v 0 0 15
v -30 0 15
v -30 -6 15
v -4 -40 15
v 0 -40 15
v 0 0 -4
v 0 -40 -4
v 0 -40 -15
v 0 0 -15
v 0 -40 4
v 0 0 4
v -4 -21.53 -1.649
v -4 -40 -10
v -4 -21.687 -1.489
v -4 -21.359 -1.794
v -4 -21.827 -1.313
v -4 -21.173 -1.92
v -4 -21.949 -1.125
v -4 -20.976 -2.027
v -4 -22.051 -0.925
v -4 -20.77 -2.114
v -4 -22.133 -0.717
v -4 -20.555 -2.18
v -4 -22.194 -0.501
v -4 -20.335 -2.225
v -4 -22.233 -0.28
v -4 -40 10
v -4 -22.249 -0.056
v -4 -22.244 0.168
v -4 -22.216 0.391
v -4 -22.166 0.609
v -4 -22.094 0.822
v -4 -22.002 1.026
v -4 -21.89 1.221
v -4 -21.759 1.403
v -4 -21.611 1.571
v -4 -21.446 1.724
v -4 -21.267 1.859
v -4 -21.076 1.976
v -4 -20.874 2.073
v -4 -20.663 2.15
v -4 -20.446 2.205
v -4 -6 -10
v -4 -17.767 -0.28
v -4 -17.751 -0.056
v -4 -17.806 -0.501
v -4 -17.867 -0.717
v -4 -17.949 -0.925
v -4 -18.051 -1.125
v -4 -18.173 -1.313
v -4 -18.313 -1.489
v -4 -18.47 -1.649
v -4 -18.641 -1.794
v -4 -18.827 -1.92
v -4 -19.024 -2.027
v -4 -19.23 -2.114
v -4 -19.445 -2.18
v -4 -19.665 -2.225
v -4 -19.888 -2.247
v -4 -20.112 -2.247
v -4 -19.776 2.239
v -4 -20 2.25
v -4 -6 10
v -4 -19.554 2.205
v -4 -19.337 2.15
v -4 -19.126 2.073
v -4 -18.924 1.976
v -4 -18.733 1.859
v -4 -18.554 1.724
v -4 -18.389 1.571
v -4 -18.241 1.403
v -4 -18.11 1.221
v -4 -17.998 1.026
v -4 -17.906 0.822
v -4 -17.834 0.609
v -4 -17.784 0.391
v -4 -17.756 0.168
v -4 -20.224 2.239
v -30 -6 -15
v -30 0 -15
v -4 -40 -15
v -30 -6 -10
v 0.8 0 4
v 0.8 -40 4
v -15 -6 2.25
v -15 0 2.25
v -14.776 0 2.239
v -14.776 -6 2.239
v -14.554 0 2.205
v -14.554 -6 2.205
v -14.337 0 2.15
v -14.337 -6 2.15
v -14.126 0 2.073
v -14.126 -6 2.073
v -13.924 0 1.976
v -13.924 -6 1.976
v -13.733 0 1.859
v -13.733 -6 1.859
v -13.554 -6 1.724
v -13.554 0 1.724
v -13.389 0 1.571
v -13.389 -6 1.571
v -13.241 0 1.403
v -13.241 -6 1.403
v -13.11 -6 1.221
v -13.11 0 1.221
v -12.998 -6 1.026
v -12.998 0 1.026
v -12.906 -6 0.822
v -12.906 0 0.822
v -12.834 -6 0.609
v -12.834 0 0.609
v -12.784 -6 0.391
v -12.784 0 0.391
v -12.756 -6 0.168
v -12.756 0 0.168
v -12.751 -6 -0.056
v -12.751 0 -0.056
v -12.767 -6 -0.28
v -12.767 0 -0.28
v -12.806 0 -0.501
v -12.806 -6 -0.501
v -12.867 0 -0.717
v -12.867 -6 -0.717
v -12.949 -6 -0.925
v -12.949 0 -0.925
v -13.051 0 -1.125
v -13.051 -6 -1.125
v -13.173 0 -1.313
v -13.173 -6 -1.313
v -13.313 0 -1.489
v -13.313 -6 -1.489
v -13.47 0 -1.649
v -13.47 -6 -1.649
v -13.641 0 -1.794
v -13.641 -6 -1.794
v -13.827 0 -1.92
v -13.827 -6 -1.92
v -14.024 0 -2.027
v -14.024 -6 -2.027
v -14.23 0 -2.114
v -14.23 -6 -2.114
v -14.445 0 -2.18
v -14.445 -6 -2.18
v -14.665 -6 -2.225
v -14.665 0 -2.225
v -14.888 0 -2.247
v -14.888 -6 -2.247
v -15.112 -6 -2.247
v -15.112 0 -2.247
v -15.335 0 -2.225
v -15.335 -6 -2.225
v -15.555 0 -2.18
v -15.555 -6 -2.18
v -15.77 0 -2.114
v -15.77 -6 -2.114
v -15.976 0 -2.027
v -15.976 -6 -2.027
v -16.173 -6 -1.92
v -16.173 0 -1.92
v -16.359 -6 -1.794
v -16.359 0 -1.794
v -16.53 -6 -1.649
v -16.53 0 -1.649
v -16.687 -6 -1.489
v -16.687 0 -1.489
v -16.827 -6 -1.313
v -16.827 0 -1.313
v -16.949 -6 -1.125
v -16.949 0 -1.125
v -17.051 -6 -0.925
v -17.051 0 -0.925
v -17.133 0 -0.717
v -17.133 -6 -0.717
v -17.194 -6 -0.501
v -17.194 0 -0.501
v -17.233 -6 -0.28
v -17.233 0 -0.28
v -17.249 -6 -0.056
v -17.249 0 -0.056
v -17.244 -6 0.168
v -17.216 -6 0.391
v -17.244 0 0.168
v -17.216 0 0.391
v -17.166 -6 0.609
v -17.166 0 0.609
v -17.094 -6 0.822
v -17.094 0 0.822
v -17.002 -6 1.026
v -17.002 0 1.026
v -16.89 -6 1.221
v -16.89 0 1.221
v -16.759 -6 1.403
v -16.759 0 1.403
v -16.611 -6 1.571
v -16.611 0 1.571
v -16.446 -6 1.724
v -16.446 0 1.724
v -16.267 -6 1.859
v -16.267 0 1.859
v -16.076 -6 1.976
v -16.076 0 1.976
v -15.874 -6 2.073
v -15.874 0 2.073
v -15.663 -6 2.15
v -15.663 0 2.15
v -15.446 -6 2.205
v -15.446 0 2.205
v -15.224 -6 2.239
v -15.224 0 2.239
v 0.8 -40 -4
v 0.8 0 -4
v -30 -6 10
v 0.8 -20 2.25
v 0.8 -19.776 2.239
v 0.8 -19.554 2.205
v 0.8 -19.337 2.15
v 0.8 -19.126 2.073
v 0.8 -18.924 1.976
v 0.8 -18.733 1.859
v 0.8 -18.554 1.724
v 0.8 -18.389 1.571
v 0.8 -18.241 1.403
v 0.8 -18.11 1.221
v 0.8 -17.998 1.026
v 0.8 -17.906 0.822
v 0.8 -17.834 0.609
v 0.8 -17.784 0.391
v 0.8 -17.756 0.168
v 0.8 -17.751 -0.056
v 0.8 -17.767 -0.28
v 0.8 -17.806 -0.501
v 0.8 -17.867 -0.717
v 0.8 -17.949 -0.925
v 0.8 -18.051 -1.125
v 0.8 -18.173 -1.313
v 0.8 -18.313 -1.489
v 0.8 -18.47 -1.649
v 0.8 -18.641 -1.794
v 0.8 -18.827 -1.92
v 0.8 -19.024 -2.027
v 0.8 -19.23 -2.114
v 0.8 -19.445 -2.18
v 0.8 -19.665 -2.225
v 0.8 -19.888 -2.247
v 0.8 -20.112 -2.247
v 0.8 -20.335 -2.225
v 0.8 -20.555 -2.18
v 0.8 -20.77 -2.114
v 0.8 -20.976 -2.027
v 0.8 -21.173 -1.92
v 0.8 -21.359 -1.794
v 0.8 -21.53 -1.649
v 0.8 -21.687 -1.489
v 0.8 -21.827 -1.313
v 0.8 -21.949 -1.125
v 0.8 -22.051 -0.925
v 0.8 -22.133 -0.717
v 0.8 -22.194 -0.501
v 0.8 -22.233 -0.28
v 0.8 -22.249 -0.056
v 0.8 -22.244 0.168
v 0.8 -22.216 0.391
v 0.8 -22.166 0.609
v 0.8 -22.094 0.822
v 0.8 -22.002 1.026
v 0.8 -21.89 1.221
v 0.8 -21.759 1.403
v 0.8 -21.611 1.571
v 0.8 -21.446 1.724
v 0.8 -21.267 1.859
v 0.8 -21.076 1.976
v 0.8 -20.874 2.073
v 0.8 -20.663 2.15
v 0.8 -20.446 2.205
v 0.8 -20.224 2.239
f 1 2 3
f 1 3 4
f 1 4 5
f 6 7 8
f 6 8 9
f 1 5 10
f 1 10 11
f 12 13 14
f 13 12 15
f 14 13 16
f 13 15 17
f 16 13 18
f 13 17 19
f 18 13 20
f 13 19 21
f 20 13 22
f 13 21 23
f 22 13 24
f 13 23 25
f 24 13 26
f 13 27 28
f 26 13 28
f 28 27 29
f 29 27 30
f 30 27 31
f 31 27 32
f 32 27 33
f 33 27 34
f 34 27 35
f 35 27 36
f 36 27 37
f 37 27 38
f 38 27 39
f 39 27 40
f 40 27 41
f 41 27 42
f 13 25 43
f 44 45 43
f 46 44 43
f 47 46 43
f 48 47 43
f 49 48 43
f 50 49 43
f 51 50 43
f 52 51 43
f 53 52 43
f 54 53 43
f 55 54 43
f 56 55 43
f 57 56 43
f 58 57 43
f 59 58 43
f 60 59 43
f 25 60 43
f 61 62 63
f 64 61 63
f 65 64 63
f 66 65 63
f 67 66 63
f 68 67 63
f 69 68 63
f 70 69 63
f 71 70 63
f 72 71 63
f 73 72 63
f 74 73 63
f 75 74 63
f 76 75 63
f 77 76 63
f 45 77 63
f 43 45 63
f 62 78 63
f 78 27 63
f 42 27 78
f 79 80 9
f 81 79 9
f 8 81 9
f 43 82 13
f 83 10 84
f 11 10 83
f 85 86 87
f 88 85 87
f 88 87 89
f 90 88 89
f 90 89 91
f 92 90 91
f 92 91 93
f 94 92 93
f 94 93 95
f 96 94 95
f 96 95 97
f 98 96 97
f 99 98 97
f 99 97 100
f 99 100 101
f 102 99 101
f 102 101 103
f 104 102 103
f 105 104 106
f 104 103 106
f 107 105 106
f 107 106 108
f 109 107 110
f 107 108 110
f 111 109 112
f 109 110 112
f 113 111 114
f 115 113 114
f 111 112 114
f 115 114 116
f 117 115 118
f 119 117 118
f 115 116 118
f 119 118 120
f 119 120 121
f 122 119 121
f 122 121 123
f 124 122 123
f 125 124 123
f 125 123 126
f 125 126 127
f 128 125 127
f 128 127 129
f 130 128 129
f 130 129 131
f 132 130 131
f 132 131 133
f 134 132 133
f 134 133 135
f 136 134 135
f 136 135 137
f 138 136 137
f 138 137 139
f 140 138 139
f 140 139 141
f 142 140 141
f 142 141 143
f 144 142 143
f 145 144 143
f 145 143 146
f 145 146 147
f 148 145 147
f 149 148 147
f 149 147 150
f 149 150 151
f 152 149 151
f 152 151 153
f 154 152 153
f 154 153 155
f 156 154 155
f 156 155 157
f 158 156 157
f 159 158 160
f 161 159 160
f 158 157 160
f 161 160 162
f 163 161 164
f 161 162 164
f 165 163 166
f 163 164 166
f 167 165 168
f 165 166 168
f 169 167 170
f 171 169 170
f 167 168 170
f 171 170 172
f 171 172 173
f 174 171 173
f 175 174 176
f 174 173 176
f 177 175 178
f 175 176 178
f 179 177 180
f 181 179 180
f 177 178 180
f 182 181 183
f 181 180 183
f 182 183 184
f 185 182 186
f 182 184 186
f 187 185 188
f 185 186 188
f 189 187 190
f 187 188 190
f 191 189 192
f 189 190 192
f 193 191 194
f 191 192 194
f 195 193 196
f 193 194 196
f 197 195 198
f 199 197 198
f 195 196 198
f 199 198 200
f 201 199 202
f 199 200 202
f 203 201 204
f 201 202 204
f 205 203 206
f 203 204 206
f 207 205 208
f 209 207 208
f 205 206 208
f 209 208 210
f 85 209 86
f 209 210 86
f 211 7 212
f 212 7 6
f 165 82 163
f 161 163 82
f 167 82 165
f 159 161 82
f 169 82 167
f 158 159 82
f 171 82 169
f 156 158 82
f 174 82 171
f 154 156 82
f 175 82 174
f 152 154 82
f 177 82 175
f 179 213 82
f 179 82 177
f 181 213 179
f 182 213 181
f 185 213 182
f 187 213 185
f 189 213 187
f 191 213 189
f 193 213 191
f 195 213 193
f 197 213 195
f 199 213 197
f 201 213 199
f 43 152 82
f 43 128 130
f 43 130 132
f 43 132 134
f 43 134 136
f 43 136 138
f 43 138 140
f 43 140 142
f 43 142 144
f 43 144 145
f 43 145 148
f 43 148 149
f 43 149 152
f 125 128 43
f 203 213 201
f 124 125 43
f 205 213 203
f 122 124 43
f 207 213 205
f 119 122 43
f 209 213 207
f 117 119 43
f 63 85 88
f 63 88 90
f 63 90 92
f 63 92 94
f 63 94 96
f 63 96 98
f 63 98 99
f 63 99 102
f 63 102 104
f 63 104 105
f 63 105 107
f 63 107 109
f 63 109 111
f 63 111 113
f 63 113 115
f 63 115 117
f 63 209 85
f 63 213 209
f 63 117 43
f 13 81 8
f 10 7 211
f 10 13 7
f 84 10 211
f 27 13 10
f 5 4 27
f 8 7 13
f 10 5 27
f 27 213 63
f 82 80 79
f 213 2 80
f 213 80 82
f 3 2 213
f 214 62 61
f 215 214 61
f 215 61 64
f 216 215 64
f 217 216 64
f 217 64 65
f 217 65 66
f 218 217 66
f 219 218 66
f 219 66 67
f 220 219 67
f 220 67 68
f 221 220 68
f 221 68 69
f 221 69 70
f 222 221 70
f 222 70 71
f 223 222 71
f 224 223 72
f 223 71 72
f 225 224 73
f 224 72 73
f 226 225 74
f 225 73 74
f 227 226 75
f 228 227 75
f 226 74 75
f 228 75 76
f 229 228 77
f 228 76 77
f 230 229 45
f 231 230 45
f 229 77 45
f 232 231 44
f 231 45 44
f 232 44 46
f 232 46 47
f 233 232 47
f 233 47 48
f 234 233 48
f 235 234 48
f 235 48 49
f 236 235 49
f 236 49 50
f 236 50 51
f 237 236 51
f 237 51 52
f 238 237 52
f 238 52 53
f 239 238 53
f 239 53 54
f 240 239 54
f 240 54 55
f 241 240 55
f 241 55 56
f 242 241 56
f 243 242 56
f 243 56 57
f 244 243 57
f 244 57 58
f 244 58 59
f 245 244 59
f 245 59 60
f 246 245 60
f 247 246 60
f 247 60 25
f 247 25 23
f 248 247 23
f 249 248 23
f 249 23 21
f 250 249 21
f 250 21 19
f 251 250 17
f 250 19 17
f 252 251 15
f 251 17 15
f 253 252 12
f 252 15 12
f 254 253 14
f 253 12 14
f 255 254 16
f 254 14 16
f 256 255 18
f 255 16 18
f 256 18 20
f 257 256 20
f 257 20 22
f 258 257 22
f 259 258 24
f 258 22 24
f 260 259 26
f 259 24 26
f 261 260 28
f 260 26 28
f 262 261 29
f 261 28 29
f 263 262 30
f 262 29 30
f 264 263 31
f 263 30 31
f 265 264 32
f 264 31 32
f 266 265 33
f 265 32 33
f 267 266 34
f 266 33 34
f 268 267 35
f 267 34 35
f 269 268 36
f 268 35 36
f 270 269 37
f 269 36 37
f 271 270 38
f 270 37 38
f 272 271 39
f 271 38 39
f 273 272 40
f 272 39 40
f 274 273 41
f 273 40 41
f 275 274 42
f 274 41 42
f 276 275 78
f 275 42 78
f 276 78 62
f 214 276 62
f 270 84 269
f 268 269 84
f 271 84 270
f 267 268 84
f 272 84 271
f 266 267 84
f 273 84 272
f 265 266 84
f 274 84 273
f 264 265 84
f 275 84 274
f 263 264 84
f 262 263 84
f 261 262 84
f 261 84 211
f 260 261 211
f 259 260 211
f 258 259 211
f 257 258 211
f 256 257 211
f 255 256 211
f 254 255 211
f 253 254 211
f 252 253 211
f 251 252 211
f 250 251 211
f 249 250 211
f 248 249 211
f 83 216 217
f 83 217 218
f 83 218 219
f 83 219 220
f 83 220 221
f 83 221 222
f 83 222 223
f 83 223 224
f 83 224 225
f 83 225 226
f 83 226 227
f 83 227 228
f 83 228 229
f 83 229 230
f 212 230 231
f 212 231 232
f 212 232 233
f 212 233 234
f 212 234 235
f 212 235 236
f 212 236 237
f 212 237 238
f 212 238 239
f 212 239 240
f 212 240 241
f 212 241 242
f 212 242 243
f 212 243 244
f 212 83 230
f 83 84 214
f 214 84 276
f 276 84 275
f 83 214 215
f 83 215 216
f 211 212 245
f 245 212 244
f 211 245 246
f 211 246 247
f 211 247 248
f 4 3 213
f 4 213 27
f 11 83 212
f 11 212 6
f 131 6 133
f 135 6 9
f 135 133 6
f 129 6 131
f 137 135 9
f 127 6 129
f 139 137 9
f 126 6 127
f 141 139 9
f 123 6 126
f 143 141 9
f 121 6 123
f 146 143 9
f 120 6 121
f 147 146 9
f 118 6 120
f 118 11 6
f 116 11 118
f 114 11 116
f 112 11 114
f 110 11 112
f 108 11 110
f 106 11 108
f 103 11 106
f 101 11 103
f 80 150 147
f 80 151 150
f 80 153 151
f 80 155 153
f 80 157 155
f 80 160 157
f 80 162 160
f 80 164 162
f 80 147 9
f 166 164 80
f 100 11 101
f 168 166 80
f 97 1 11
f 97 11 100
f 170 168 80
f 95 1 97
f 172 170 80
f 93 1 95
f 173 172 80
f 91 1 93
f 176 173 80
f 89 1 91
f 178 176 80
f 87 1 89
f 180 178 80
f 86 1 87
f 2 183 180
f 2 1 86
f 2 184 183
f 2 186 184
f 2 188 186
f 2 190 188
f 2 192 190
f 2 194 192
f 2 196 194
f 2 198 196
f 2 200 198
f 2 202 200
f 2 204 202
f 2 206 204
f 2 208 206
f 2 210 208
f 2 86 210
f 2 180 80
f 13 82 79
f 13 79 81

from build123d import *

# Parameters (mm, degrees)
BOSS_EXTRUDE1_DEPTH = 15
SKETCH2_W           = 8
SKETCH2_H           = 40
BOSS_EXTRUDE2_DEPTH = 0.8
SKETCH3_W           = 26
SKETCH3_H           = 34
CUT_EXTRUDE1_DEPTH  = 10
SKETCH4_R           = 2.25
CUT_EXTRUDE2_DEPTH  = 51.009999
SKETCH5_R           = 2.25
CUT_EXTRUDE3_DEPTH  = 53.201532545


with BuildPart() as part:
    # Sketch1 → Boss-Extrude1 (new, symmetric)
    with BuildSketch(Plane.XY):
        Polygon((0, 0), (-30, 0), (-30, -6), (-4, -40), (0, -40), align=None)
    extrude(amount=BOSS_EXTRUDE1_DEPTH, both=True)

    # Sketch2 → Boss-Extrude2 (add)
    with BuildSketch(Plane(origin=(0, 0, 0), x_dir=(0, 0, -1), z_dir=(1, 0, 0))):
        with Locations((0, -20)):
            Rectangle(SKETCH2_W, SKETCH2_H)
    extrude(amount=BOSS_EXTRUDE2_DEPTH)

    # Sketch3 → Cut-Extrude1 (cut, symmetric)
    with BuildSketch(Plane.XY):
        with Locations((-17, -23)):
            Rectangle(SKETCH3_W, SKETCH3_H)
    extrude(amount=CUT_EXTRUDE1_DEPTH, both=True, mode=Mode.SUBTRACT)

    # Sketch4 → Cut-Extrude2 (cut, through all)
    with BuildSketch(Plane.ZY.offset(4)):
        with Locations((0, -20)):
            Circle(SKETCH4_R)
    extrude(amount=-CUT_EXTRUDE2_DEPTH, mode=Mode.SUBTRACT)

    # Sketch5 → Cut-Extrude3 (cut, through all)
    with BuildSketch(Plane(origin=(0, 0, 0), x_dir=(1, 0, 0), z_dir=(0, 1, 0))):
        with Locations(Location((-15, 0, 0), (0, 0, 270))):
            Circle(SKETCH5_R)
    extrude(amount=-CUT_EXTRUDE3_DEPTH, mode=Mode.SUBTRACT)


solid = part.part
